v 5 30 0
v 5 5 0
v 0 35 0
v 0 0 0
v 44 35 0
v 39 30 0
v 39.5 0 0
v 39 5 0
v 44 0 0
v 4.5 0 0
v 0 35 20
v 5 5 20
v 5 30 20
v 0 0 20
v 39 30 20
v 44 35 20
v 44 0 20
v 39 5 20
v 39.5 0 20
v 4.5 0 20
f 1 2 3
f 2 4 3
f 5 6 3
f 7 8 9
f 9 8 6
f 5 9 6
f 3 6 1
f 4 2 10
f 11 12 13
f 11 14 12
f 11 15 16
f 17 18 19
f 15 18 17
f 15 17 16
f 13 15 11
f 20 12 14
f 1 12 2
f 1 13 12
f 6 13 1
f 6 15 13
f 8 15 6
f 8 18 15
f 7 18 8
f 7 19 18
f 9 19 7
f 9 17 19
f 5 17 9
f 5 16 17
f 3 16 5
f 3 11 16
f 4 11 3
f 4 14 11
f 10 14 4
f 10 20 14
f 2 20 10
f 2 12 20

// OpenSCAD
// u clip by stephan hafiz
ClipInnerWidth = 34;
ClipInnerHight = 30;
ClipThikiness = 5;
ClipHigh = 20;

color ("red") linear_extrude (ClipHigh)
polygon(points=[[0,0],[ClipThikiness-ClipThikiness/10,0],[ClipThikiness,ClipThikiness],
		[ClipThikiness,ClipInnerHight],[ClipThikiness+ClipInnerWidth,ClipInnerHight],[ClipThikiness+ClipInnerWidth,ClipThikiness],[ClipThikiness+ClipInnerWidth+ClipThikiness/10,0],
		[ClipThikiness+ClipInnerWidth+ClipThikiness,0], [ClipThikiness+ClipInnerWidth+ClipThikiness,ClipInnerHight+ClipThikiness],[0,ClipInnerHight+ClipThikiness]
	     ]);
